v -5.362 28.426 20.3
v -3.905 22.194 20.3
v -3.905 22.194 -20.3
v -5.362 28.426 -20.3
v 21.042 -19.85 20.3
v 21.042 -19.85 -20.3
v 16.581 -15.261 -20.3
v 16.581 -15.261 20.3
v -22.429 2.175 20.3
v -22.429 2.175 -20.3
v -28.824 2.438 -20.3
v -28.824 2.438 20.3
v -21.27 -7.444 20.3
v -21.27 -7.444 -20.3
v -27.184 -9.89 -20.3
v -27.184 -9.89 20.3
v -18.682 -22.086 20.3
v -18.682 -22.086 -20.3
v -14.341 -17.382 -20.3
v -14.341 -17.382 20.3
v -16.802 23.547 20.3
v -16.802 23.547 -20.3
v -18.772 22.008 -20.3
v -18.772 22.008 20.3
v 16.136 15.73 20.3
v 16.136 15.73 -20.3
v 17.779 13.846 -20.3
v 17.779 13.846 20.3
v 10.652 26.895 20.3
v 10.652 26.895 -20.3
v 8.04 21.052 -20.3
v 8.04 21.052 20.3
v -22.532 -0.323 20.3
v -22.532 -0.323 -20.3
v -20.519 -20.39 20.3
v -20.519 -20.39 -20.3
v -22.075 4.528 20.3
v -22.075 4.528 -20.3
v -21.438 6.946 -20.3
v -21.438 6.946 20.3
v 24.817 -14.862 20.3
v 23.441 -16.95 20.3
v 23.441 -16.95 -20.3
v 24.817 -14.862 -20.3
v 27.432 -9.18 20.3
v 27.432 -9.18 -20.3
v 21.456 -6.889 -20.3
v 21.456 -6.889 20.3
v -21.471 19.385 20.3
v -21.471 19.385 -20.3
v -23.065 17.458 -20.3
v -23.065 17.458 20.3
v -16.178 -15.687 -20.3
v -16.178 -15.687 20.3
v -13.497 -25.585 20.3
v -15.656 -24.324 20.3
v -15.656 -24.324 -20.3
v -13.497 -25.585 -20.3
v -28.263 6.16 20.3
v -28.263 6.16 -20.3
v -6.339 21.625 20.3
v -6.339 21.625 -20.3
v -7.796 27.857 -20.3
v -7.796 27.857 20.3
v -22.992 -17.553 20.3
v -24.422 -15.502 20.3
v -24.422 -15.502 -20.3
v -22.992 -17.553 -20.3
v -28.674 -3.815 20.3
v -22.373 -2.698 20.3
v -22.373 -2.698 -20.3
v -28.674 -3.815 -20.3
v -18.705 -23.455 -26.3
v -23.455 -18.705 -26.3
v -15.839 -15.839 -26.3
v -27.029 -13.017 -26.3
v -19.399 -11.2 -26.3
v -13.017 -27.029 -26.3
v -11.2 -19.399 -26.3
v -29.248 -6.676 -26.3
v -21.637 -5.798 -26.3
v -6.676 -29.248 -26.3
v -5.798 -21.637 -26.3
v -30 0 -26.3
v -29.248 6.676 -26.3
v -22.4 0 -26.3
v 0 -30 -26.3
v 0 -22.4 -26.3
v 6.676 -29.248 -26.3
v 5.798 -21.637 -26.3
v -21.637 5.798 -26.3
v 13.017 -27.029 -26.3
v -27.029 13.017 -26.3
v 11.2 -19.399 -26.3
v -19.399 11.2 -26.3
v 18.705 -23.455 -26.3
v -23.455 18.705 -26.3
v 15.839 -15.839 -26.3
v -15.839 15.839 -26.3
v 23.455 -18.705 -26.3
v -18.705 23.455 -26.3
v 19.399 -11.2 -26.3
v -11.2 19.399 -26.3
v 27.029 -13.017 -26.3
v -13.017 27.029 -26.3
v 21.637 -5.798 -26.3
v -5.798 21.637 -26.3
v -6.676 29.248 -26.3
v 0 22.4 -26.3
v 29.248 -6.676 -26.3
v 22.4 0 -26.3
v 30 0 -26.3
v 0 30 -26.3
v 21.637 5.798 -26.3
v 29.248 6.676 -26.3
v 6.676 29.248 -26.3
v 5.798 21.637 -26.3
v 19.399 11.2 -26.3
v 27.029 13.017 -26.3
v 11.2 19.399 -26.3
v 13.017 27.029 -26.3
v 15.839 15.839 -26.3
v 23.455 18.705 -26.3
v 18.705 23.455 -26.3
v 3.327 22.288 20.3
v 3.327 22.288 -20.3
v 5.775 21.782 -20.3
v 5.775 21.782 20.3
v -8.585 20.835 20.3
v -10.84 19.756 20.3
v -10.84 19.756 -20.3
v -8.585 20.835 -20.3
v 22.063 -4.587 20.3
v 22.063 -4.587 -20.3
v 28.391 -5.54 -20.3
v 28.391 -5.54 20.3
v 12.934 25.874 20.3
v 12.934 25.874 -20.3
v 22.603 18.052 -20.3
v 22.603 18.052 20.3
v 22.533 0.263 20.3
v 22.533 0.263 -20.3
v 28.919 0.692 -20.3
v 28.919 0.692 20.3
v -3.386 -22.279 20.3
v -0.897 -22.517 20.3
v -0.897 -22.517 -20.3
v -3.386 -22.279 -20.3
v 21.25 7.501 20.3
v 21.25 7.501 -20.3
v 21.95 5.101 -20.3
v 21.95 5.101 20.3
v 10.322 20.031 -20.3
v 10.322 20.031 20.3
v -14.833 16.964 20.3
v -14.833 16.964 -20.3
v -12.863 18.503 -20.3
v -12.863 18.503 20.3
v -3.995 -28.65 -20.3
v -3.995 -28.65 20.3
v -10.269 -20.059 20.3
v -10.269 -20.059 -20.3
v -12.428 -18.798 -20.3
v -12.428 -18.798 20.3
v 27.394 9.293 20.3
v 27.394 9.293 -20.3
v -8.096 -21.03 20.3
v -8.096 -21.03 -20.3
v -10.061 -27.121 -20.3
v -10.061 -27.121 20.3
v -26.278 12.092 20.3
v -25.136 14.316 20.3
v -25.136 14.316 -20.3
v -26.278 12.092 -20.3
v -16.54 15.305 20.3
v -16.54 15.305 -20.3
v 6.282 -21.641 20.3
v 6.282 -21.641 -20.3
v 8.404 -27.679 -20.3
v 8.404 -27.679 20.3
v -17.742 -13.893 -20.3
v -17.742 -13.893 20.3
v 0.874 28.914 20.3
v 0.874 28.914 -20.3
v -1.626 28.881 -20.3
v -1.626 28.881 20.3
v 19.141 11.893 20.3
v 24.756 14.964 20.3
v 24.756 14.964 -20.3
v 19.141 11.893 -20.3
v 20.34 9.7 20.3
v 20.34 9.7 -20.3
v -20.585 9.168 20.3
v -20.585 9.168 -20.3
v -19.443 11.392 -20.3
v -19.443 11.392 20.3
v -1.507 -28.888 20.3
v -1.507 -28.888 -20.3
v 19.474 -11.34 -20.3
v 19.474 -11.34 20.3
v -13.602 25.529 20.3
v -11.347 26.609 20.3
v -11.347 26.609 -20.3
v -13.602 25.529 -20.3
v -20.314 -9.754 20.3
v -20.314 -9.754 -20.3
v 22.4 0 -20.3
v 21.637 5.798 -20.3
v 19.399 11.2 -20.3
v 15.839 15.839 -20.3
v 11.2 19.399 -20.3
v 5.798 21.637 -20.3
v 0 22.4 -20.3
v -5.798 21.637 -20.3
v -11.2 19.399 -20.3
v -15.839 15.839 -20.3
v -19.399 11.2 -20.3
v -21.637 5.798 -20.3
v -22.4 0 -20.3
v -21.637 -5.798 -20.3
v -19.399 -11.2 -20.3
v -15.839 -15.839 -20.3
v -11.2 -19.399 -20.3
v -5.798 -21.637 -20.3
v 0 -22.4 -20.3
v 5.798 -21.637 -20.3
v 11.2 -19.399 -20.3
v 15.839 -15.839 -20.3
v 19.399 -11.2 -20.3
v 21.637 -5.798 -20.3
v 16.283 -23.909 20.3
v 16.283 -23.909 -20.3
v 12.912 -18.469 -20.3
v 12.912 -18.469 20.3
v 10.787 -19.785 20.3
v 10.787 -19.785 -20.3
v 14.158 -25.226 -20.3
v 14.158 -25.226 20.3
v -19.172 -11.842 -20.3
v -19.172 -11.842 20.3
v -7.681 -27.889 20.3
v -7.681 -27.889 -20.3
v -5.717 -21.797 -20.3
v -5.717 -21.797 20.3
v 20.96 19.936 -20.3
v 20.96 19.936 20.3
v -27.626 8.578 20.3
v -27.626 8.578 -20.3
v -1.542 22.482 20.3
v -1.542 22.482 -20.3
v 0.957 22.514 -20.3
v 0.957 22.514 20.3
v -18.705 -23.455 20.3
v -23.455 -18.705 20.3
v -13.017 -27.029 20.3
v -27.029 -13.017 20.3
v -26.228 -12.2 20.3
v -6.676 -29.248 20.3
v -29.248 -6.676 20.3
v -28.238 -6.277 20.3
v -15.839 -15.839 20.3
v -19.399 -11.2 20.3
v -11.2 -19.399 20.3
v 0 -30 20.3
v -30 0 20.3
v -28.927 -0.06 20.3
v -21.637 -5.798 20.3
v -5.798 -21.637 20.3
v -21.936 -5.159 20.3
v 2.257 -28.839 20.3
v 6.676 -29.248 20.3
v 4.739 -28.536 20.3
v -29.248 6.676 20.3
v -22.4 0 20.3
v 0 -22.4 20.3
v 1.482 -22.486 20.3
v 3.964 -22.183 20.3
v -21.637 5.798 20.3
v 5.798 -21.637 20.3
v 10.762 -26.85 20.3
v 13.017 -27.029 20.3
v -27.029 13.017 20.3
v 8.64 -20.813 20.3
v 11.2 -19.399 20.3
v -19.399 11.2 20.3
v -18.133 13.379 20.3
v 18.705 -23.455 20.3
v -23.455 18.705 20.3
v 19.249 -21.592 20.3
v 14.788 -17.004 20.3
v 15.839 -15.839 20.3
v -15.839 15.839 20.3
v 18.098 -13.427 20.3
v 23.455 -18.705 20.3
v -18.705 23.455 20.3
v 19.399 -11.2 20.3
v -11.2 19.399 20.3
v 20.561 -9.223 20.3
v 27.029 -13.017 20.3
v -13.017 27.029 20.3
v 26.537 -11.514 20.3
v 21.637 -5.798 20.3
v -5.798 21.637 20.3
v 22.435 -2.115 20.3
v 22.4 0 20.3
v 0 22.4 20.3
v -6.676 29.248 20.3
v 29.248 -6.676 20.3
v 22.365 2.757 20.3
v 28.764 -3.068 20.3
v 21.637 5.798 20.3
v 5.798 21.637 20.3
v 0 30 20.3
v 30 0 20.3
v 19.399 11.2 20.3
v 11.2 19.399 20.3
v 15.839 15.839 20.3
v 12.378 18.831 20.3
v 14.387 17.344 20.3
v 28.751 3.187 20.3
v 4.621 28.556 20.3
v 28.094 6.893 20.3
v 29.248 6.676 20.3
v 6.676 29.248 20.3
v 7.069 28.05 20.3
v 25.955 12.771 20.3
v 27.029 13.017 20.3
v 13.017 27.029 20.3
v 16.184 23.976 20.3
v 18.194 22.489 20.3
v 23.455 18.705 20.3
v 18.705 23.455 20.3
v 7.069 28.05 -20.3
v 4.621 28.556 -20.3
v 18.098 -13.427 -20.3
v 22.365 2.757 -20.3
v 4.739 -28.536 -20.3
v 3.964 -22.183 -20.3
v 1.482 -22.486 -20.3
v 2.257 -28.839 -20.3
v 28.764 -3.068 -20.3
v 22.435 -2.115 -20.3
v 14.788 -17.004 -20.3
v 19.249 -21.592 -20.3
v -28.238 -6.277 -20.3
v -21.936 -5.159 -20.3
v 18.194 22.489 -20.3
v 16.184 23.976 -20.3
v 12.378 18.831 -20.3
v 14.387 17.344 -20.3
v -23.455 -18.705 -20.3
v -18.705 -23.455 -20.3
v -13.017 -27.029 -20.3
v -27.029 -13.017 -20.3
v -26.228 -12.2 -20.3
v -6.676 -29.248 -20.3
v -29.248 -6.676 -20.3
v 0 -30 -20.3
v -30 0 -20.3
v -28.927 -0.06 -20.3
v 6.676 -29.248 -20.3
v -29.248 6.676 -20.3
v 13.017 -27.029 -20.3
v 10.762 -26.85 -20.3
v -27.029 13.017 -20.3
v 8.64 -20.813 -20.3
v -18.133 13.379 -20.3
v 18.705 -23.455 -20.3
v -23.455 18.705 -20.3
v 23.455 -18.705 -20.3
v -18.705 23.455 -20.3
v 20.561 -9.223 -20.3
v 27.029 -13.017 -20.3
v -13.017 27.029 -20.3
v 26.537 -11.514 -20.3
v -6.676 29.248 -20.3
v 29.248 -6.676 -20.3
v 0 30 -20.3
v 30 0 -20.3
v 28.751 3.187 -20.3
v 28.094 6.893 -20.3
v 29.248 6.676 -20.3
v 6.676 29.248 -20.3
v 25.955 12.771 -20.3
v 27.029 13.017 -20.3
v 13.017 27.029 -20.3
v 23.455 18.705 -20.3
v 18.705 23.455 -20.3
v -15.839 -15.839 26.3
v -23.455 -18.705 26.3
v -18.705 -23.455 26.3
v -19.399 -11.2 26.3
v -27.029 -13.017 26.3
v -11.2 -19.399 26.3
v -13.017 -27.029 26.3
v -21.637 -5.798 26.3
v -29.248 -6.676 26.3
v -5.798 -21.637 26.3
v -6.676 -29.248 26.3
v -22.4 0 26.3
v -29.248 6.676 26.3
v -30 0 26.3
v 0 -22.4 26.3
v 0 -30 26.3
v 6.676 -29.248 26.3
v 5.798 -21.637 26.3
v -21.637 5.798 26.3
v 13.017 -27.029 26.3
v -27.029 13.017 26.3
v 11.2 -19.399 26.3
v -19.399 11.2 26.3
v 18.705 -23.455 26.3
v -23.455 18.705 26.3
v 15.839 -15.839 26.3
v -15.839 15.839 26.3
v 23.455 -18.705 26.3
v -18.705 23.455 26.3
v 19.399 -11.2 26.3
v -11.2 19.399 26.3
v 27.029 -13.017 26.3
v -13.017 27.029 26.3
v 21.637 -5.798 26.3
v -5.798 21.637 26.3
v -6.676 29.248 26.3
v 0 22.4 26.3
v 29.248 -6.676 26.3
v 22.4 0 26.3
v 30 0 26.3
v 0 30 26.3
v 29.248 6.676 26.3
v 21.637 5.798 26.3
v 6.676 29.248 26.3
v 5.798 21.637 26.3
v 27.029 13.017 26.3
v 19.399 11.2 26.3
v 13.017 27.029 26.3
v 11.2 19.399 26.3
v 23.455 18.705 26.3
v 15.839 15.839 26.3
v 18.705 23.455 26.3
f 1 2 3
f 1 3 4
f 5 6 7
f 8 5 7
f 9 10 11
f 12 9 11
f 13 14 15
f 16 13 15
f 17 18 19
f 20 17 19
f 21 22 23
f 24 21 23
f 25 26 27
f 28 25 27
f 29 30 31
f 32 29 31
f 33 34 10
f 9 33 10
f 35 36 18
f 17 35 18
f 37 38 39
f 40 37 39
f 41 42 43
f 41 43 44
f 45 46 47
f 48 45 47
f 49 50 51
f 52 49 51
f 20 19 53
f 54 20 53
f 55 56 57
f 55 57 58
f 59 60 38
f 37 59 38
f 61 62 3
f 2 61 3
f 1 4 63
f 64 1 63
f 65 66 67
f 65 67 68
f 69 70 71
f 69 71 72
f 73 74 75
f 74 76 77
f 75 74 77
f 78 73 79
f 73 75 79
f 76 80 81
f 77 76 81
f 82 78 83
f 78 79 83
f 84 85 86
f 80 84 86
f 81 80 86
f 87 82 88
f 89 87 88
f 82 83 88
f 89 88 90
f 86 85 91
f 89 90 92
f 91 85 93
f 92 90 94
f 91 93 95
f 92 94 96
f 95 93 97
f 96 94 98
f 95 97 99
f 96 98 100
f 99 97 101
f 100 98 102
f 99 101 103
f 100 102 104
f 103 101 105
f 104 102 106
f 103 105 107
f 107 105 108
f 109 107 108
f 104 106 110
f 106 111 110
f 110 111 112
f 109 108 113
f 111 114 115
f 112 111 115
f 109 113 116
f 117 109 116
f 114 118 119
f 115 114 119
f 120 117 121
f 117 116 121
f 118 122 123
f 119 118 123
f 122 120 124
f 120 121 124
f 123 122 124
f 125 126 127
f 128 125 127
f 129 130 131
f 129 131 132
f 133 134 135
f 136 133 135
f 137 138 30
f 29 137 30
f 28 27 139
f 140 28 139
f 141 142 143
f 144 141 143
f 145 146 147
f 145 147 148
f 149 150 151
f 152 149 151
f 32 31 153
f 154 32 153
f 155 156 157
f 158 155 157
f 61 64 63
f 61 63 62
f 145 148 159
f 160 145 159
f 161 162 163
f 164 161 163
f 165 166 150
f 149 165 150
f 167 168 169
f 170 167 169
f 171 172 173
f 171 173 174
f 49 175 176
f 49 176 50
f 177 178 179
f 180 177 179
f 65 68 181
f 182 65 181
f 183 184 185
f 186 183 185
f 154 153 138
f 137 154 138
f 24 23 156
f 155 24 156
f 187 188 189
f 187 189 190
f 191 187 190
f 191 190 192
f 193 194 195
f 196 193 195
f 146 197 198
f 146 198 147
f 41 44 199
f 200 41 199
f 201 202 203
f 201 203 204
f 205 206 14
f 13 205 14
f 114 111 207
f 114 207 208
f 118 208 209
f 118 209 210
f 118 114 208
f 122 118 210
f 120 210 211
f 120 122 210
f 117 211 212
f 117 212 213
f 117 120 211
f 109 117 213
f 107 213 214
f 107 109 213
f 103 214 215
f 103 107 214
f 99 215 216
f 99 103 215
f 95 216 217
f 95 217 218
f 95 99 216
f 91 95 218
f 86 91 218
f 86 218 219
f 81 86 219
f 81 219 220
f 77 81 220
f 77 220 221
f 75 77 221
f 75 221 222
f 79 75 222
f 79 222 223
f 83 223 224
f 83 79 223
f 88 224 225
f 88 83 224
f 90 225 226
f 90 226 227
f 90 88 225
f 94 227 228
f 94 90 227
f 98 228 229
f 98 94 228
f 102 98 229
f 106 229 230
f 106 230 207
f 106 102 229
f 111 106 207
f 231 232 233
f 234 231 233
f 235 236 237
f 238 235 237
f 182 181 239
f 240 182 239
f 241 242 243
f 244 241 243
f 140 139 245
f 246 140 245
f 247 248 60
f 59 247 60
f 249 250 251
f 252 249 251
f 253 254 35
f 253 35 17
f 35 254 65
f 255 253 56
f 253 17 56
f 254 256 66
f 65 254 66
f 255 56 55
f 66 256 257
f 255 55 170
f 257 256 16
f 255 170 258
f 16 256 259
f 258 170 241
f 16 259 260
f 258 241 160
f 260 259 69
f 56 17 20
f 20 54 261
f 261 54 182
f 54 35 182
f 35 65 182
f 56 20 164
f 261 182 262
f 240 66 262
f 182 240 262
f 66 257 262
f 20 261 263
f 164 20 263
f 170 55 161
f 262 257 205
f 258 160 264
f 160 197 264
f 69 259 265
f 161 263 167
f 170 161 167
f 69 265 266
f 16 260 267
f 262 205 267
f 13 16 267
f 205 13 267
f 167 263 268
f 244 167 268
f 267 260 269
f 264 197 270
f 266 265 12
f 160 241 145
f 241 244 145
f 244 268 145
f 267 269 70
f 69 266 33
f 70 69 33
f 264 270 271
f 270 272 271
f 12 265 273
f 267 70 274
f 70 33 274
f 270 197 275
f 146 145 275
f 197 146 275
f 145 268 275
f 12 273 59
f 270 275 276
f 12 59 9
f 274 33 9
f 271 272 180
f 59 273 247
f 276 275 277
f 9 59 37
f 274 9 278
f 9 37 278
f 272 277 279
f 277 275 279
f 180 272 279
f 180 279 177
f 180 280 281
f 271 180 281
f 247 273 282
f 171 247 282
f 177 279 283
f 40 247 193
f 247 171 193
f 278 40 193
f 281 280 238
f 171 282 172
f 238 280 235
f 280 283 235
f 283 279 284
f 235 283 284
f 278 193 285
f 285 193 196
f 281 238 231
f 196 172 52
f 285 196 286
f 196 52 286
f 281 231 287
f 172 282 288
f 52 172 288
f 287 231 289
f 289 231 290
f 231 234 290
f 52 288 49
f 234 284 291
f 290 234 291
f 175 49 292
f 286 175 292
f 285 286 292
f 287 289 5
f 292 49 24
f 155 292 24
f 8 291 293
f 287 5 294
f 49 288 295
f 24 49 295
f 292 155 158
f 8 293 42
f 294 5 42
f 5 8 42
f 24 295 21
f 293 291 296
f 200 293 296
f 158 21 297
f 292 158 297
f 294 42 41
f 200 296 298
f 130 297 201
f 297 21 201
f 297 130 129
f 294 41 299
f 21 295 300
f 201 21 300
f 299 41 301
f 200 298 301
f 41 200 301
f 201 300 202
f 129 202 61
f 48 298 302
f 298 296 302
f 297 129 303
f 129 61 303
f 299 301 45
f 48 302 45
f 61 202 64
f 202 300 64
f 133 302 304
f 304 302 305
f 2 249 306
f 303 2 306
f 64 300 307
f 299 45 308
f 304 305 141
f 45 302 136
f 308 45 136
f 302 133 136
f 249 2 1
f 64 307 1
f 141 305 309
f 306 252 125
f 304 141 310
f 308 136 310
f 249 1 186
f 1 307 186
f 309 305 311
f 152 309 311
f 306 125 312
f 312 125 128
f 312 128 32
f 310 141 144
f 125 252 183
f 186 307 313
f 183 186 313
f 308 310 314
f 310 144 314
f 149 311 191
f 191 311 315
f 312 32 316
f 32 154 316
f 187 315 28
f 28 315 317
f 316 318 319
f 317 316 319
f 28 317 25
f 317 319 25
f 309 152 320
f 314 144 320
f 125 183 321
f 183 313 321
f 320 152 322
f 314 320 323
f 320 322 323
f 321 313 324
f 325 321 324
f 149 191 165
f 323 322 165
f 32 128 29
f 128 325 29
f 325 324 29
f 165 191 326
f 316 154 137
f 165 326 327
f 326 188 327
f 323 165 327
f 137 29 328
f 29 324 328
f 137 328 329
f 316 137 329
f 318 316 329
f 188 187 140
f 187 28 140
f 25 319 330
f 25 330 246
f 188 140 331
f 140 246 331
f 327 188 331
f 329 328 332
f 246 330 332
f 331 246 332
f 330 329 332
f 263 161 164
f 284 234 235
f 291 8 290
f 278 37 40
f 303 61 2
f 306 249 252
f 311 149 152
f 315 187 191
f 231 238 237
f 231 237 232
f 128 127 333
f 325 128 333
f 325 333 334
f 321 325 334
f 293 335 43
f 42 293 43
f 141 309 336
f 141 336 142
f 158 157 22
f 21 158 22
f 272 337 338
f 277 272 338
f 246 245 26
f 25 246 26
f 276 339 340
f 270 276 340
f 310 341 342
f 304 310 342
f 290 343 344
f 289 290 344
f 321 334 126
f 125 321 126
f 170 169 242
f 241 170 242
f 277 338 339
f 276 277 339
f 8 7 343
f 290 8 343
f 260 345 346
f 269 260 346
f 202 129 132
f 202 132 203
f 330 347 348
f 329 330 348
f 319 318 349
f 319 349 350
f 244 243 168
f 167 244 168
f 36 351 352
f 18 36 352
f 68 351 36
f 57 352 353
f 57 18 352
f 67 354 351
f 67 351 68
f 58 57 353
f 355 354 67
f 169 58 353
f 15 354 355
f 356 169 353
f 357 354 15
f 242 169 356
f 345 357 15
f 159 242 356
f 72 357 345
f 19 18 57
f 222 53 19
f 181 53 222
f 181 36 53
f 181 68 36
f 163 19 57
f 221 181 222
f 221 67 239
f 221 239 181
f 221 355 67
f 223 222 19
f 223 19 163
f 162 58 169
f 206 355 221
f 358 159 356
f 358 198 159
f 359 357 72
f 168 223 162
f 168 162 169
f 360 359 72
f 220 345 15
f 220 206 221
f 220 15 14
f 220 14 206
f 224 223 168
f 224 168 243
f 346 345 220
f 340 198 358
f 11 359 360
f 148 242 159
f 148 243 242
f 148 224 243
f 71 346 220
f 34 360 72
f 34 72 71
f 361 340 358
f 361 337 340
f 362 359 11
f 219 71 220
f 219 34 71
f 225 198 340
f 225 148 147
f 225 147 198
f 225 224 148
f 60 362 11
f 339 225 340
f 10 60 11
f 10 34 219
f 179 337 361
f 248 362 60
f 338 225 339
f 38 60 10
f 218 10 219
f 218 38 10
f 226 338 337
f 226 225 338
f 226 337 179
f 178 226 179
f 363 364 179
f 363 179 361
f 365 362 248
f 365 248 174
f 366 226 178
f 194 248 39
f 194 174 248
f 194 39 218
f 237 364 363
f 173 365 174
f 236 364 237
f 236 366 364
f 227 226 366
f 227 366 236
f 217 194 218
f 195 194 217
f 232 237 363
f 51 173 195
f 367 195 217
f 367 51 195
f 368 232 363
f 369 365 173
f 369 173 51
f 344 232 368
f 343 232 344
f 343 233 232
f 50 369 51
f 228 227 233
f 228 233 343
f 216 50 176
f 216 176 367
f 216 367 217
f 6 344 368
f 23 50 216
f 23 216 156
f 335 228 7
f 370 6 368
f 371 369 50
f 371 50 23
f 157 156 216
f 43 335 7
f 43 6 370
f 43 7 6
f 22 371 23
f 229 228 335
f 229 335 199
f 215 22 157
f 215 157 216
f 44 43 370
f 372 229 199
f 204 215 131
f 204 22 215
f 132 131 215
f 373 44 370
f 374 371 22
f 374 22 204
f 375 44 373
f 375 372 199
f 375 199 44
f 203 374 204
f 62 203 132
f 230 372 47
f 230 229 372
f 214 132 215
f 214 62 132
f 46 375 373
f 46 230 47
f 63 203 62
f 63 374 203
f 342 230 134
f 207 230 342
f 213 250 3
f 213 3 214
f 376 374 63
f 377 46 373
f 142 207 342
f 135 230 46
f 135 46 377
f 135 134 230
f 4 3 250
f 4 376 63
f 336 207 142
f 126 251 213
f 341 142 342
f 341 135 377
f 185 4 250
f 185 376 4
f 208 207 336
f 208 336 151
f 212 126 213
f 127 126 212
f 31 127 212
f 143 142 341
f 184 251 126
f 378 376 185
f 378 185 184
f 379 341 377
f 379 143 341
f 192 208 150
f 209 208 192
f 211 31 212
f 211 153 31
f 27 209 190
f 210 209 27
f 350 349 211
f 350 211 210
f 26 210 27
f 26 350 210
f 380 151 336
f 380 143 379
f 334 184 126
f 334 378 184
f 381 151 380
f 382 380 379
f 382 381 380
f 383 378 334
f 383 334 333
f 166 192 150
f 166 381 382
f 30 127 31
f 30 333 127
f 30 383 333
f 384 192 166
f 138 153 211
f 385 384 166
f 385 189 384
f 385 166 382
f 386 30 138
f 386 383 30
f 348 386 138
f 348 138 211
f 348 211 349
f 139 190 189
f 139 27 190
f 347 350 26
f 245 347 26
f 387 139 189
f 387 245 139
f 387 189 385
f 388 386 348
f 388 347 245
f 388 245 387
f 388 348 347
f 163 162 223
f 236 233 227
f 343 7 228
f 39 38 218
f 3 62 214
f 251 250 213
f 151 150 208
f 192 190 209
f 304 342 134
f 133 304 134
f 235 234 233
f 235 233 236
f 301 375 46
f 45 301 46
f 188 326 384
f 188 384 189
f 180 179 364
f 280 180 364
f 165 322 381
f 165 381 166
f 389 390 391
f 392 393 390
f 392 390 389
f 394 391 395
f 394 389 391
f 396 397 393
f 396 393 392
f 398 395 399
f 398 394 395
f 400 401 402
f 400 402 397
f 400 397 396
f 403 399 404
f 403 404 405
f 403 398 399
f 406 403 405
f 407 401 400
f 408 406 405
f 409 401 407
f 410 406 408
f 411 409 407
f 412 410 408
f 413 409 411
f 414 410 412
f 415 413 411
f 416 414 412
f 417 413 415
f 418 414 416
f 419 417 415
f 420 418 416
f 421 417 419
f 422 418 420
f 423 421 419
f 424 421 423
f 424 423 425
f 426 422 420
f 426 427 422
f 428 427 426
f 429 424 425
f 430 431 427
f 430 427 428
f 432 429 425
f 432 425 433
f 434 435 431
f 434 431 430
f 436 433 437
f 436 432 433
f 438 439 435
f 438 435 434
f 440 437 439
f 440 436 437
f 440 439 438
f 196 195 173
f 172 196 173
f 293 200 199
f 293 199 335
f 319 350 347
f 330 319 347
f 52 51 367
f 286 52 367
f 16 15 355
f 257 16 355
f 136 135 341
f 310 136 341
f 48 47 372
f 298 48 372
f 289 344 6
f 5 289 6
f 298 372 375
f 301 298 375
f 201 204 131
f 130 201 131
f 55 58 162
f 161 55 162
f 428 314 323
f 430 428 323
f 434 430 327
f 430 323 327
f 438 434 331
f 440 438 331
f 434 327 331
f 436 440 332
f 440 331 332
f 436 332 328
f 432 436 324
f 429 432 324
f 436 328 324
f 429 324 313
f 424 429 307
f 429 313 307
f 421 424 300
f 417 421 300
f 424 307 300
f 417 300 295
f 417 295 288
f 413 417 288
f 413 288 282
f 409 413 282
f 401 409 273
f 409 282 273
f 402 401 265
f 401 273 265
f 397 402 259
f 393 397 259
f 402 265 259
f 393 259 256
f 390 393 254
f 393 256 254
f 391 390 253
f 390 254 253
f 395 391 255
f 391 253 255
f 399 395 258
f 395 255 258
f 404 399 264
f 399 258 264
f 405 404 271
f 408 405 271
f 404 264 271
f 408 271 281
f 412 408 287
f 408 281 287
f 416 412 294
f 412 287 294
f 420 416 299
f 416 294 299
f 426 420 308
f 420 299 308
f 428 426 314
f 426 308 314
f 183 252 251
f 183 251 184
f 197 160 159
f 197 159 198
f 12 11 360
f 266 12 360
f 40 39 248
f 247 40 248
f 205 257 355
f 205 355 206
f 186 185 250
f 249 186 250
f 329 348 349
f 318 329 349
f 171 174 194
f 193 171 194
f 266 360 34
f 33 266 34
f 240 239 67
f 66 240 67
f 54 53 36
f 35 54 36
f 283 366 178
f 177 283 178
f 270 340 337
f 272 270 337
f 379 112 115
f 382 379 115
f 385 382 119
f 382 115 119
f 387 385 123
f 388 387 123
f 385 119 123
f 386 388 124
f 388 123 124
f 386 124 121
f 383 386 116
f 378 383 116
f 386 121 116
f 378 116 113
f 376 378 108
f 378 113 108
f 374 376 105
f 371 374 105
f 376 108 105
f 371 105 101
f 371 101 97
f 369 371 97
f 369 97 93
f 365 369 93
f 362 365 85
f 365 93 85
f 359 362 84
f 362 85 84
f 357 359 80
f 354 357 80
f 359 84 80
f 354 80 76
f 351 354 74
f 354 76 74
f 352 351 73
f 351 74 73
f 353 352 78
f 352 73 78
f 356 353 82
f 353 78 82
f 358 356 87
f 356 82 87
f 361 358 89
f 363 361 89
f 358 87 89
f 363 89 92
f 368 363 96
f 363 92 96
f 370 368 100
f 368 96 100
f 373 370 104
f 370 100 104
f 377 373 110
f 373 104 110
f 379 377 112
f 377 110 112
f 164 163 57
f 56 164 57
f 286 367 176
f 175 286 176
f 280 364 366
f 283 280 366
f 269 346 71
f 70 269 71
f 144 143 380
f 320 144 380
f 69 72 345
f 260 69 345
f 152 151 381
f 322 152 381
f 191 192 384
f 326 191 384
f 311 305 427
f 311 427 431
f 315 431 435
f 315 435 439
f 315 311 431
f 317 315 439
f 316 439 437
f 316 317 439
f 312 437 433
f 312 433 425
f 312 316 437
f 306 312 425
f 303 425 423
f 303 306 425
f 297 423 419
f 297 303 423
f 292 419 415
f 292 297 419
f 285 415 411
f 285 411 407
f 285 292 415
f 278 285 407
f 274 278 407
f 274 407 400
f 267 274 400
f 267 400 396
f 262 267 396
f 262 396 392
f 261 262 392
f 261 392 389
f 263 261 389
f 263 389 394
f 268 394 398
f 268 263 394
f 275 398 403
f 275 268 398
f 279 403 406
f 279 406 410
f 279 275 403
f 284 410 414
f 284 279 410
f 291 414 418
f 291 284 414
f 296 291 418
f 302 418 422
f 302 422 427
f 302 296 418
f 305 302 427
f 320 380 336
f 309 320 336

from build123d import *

# Parameters (mm, degrees)
BARS_START           = -20.4
BARS_DEPTH           = 40.8
BARS_2_DEPTH         = 40.8
BARS_3_DEPTH         = 40.8
BARS_4_DEPTH         = 40.8
BARS_5_DEPTH         = 40.8
BARS_6_DEPTH         = 40.8
BARS_7_DEPTH         = 40.8
BARS_8_DEPTH         = 40.8
BARS_9_DEPTH         = 40.8
BARS_10_DEPTH        = 40.8
BARS_11_DEPTH        = 40.8
BARS_12_DEPTH        = 40.8
BARS_13_DEPTH        = 40.8
BARS_14_DEPTH        = 40.8
BARS_15_DEPTH        = 40.8
BARS_16_DEPTH        = 40.8
BARS_17_DEPTH        = 40.8
BARS_18_DEPTH        = 40.8
BARS_19_DEPTH        = 40.8
BARS_20_DEPTH        = 40.8
BARS_21_DEPTH        = 40.8
BARS_22_DEPTH        = 40.8
BARS_23_DEPTH        = 40.8
BARS_24_DEPTH        = 40.8
BARS_25_DEPTH        = 40.8
BARS_26_DEPTH        = 40.8
BARS_27_DEPTH        = 40.8
BARS_28_DEPTH        = 40.8
BARS_29_DEPTH        = 40.8
END_RING_FRONT_START = 20.3
SKETCH_2_R           = 30
SKETCH_2_R_2         = 22.4
END_RING_FRONT_DEPTH = 6
END_RING_REAR_START  = -26.3
SKETCH_3_R           = 30
SKETCH_3_R_2         = 22.4
END_RING_REAR_DEPTH  = 6


with BuildPart() as part:
    # Эскиз1 → Bars (new body)
    with BuildSketch(Plane.XY.offset(BARS_START)):
        Polygon((22.533161901, 0.262896843), (28.918731651, 0.692430264), (28.750945159, 3.186793448), (22.365375408, 2.757260027), align=None)
    extrude(amount=BARS_DEPTH)



with BuildPart() as body_2:
    # Эскиз1 → Bars 2 (new body)
    with BuildSketch(Plane.XY.offset(BARS_START)):
        Polygon((21.949834048, 5.100714194), (28.093775737, 6.892914103), (27.393697648, 9.292891325), (21.249755958, 7.500691416), align=None)
    extrude(amount=BARS_2_DEPTH)


with BuildPart() as body_3:
    # Эскиз1 → Bars 3 (new body)
    with BuildSketch(Plane.XY.offset(BARS_START)):
        Polygon((20.34015635, 9.700027818), (25.955186093, 12.771092939), (24.755551281, 14.964463933), (19.140521537, 11.893398812), align=None)
    extrude(amount=BARS_3_DEPTH)


with BuildPart() as body_4:
    # Эскиз1 → Bars 4 (new body)
    with BuildSketch(Plane.XY.offset(BARS_START)):
        Polygon((17.779395547, 13.845778923), (22.602960795, 18.052109663), (20.959862849, 19.936314838), (16.136297602, 15.729984098), align=None)
    extrude(amount=BARS_4_DEPTH)


with BuildPart() as body_5:
    # Эскиз1 → Bars 5 (new body)
    with BuildSketch(Plane.XY.offset(BARS_START)):
        Polygon((14.387289969, 17.344116793), (18.193846171, 22.489029803), (16.184114527, 23.97596582), (12.377558325, 18.83105281), align=None)
    extrude(amount=BARS_5_DEPTH)


with BuildPart() as body_6:
    # Эскиз1 → Bars 6 (new body)
    with BuildSketch(Plane.XY.offset(BARS_START)):
        Polygon((10.322450703, 20.031463039), (12.934007522, 25.874387904), (10.651614996, 26.894527287), (8.040058177, 21.051602421), align=None)
    extrude(amount=BARS_6_DEPTH)


with BuildPart() as body_7:
    # Эскиз1 → Bars 7 (new body)
    with BuildSketch(Plane.XY.offset(BARS_START)):
        Polygon((5.774945114, 21.782160337), (7.069389055, 28.049888385), (4.621057787, 28.555530549), (3.326613846, 22.287802501), align=None)
    extrude(amount=BARS_7_DEPTH)


with BuildPart() as body_8:
    # Эскиз1 → Bars 8 (new body)
    with BuildSketch(Plane.XY.offset(BARS_START)):
        Polygon((0.95740951, 22.514348026), (0.874213814, 28.913807259), (-1.625574949, 28.88130894), (-1.542379252, 22.481849707), align=None)
    extrude(amount=BARS_8_DEPTH)


with BuildPart() as body_9:
    # Эскиз1 → Bars 9 (new body)
    with BuildSketch(Plane.XY.offset(BARS_START)):
        Polygon((-3.904893498, 22.193789824), (-5.361838694, 28.425748641), (-7.796197607, 27.856629424), (-6.339252411, 21.624670607), align=None)
    extrude(amount=BARS_9_DEPTH)


with BuildPart() as body_10:
    # Эскиз1 → Bars 10 (new body)
    with BuildSketch(Plane.XY.offset(BARS_START)):
        Polygon((-8.584608027, 20.835474677), (-11.347177584, 26.60853361), (-13.602278729, 25.529404877), (-10.839709172, 19.756345944), align=None)
    extrude(amount=BARS_10_DEPTH)


with BuildPart() as body_11:
    # Эскиз1 → Bars 11 (new body)
    with BuildSketch(Plane.XY.offset(BARS_START)):
        Polygon((-12.862915825, 18.502915891), (-16.801935061, 23.547133121), (-18.772332416, 22.008453732), (-14.83331318, 16.964236502), align=None)
    extrude(amount=BARS_11_DEPTH)


with BuildPart() as body_12:
    # Эскиз1 → Bars 12 (new body)
    with BuildSketch(Plane.XY.offset(BARS_START)):
        Polygon((-16.539767975, 15.305181323), (-21.471052729, 19.384694857), (-23.064612703, 17.45841175), (-18.13332795, 13.378898216), align=None)
    extrude(amount=BARS_12_DEPTH)


with BuildPart() as body_13:
    # Эскиз1 → Bars 13 (new body)
    with BuildSketch(Plane.XY.offset(BARS_START)):
        Polygon((-19.443238958, 11.391793486), (-25.136207835, 14.315849807), (-26.278417335, 12.092033839), (-20.585448458, 9.167977519), align=None)
    extrude(amount=BARS_13_DEPTH)


with BuildPart() as body_14:
    # Эскиз1 → Bars 14 (new body)
    with BuildSketch(Plane.XY.offset(BARS_START)):
        Polygon((-21.437565696, 6.945738047), (-27.626021799, 8.57761153), (-28.263472378, 6.160245865), (-22.075016276, 4.528372382), align=None)
    extrude(amount=BARS_14_DEPTH)


with BuildPart() as body_15:
    # Эскиз1 → Bars 15 (new body)
    with BuildSketch(Plane.XY.offset(BARS_START)):
        Polygon((-22.429495689, 2.174907617), (-28.824073688, 2.438293672), (-28.926958866, -0.059588359), (-22.532380867, -0.322974414), align=None)
    extrude(amount=BARS_15_DEPTH)


with BuildPart() as body_16:
    # Эскиз1 → Bars 16 (new body)
    with BuildSketch(Plane.XY.offset(BARS_START)):
        Polygon((-22.372647392, -2.697619077), (-28.674343927, -3.815036088), (-28.237852907, -6.276636298), (-21.936156372, -5.159219286), align=None)
    extrude(amount=BARS_16_DEPTH)


with BuildPart() as body_17:
    # Эскиз1 → Bars 17 (new body)
    with BuildSketch(Plane.XY.offset(BARS_START)):
        Polygon((-21.269678968, -7.4440081), (-27.183833713, -9.889979002), (-26.22837633, -12.200195699), (-20.314221585, -9.754224798), align=None)
    extrude(amount=BARS_17_DEPTH)


with BuildPart() as body_18:
    # Эскиз1 → Bars 18 (new body)
    with BuildSketch(Plane.XY.offset(BARS_START)):
        Polygon((-19.172163995, -11.842323579), (-24.422237648, -15.502477488), (-22.992490027, -17.553287509), (-17.742416374, -13.893133599), align=None)
    extrude(amount=BARS_18_DEPTH)


with BuildPart() as body_19:
    # Эскиз1 → Bars 19 (new body)
    with BuildSketch(Plane.XY.offset(BARS_START)):
        Polygon((-16.178179942, -15.686905168), (-20.518684893, -20.390097358), (-18.681500444, -22.085607104), (-14.340995493, -17.382414915), align=None)
    extrude(amount=BARS_19_DEPTH)


with BuildPart() as body_20:
    # Эскиз1 → Bars 20 (new body)
    with BuildSketch(Plane.XY.offset(BARS_START)):
        Polygon((-12.427722176, -18.797984507), (-15.655701238, -24.324298936), (-13.496984664, -25.585228257), (-10.269005602, -20.058913828), align=None)
    extrude(amount=BARS_20_DEPTH)


with BuildPart() as body_21:
    # Эскиз1 → Bars 21 (new body)
    with BuildSketch(Plane.XY.offset(BARS_START)):
        Polygon((-8.096157933, -21.030090982), (-10.060674393, -27.121123332), (-7.681364881, -27.888512573), (-5.716848422, -21.797480224), align=None)
    extrude(amount=BARS_21_DEPTH)


with BuildPart() as body_22:
    # Эскиз1 → Bars 22 (new body)
    with BuildSketch(Plane.XY.offset(BARS_START)):
        Polygon((-3.386026344, -22.278853777), (-3.995221595, -28.649794143), (-1.506573014, -28.887761037), (-0.897377763, -22.516820671), align=None)
    extrude(amount=BARS_22_DEPTH)


with BuildPart() as body_23:
    # Эскиз1 → Bars 23 (new body)
    with BuildSketch(Plane.XY.offset(BARS_START)):
        Polygon((1.482432074, -22.48588213), (2.257043325, -28.838832421), (4.738664533, -28.536249902), (3.964053282, -22.18329961), align=None)
    extrude(amount=BARS_23_DEPTH)


with BuildPart() as body_24:
    # Эскиз1 → Bars 24 (new body)
    with BuildSketch(Plane.XY.offset(BARS_START)):
        Polygon((6.281573616, -21.641495625), (8.403771407, -27.679398948), (10.762327392, -26.850415436), (8.640129601, -20.812512113), align=None)
    extrude(amount=BARS_24_DEPTH)


with BuildPart() as body_25:
    # Эскиз1 → Bars 25 (new body)
    with BuildSketch(Plane.XY.offset(BARS_START)):
        Polygon((10.786995757, -19.785176839), (14.157548478, -25.225707544), (16.282755785, -23.909085387), (12.912203064, -18.468554682), align=None)
    extrude(amount=BARS_25_DEPTH)


with BuildPart() as body_26:
    # Эскиз1 → Bars 26 (new body)
    with BuildSketch(Plane.XY.offset(BARS_START)):
        Polygon((14.788029965, -17.003725173), (19.249334318, -21.592490091), (21.041820614, -19.849793078), (16.580516262, -15.26102816), align=None)
    extrude(amount=BARS_26_DEPTH)


with BuildPart() as body_27:
    # Эскиз1 → Bars 27 (new body)
    with BuildSketch(Plane.XY.offset(BARS_START)):
        Polygon((18.097592328, -13.427198216), (23.441042678, -16.9496318), (24.816993297, -14.862346507), (19.473542947, -11.339912923), align=None)
    extrude(amount=BARS_27_DEPTH)


with BuildPart() as body_28:
    # Эскиз1 → Bars 28 (new body)
    with BuildSketch(Plane.XY.offset(BARS_START)):
        Polygon((20.560931388, -9.222830393), (26.536673936, -11.514227564), (27.431750956, -9.179953131), (21.456008407, -6.88855596), align=None)
    extrude(amount=BARS_28_DEPTH)


with BuildPart() as body_29:
    # Эскиз1 → Bars 29 (new body)
    with BuildSketch(Plane.XY.offset(BARS_START)):
        Polygon((22.062864148, -4.587213273), (28.391479815, -5.540430844), (28.763830428, -3.068315349), (22.435214761, -2.115097778), align=None)
    extrude(amount=BARS_29_DEPTH)


with BuildPart() as part_1:
    add(part.part)

    add(body_2.part)  # End_ring_front merges body 2

    add(body_3.part)  # End_ring_front merges body 3

    add(body_4.part)  # End_ring_front merges body 4

    add(body_5.part)  # End_ring_front merges body 5

    add(body_6.part)  # End_ring_front merges body 6

    add(body_7.part)  # End_ring_front merges body 7

    add(body_8.part)  # End_ring_front merges body 8

    add(body_9.part)  # End_ring_front merges body 9

    add(body_10.part)  # End_ring_front merges body 10

    add(body_11.part)  # End_ring_front merges body 11

    add(body_12.part)  # End_ring_front merges body 12

    add(body_13.part)  # End_ring_front merges body 13

    add(body_14.part)  # End_ring_front merges body 14

    add(body_15.part)  # End_ring_front merges body 15

    add(body_16.part)  # End_ring_front merges body 16

    add(body_17.part)  # End_ring_front merges body 17

    add(body_18.part)  # End_ring_front merges body 18

    add(body_19.part)  # End_ring_front merges body 19

    add(body_20.part)  # End_ring_front merges body 20

    add(body_21.part)  # End_ring_front merges body 21

    add(body_22.part)  # End_ring_front merges body 22

    add(body_23.part)  # End_ring_front merges body 23

    add(body_24.part)  # End_ring_front merges body 24

    add(body_25.part)  # End_ring_front merges body 25

    add(body_26.part)  # End_ring_front merges body 26

    add(body_27.part)  # End_ring_front merges body 27

    add(body_28.part)  # End_ring_front merges body 28

    add(body_29.part)  # End_ring_front merges body 29
    # Эскиз2 → End_ring_front (add)
    with BuildSketch(Plane.XY.offset(END_RING_FRONT_START)):
        Circle(SKETCH_2_R)
        Circle(SKETCH_2_R_2, mode=Mode.SUBTRACT)
    extrude(amount=END_RING_FRONT_DEPTH)

    # Эскиз3 → End_ring_rear (add)
    with BuildSketch(Plane.XY.offset(END_RING_REAR_START)):
        Circle(SKETCH_3_R)
        Circle(SKETCH_3_R_2, mode=Mode.SUBTRACT)
    extrude(amount=END_RING_REAR_DEPTH)


solid = part_1.part
